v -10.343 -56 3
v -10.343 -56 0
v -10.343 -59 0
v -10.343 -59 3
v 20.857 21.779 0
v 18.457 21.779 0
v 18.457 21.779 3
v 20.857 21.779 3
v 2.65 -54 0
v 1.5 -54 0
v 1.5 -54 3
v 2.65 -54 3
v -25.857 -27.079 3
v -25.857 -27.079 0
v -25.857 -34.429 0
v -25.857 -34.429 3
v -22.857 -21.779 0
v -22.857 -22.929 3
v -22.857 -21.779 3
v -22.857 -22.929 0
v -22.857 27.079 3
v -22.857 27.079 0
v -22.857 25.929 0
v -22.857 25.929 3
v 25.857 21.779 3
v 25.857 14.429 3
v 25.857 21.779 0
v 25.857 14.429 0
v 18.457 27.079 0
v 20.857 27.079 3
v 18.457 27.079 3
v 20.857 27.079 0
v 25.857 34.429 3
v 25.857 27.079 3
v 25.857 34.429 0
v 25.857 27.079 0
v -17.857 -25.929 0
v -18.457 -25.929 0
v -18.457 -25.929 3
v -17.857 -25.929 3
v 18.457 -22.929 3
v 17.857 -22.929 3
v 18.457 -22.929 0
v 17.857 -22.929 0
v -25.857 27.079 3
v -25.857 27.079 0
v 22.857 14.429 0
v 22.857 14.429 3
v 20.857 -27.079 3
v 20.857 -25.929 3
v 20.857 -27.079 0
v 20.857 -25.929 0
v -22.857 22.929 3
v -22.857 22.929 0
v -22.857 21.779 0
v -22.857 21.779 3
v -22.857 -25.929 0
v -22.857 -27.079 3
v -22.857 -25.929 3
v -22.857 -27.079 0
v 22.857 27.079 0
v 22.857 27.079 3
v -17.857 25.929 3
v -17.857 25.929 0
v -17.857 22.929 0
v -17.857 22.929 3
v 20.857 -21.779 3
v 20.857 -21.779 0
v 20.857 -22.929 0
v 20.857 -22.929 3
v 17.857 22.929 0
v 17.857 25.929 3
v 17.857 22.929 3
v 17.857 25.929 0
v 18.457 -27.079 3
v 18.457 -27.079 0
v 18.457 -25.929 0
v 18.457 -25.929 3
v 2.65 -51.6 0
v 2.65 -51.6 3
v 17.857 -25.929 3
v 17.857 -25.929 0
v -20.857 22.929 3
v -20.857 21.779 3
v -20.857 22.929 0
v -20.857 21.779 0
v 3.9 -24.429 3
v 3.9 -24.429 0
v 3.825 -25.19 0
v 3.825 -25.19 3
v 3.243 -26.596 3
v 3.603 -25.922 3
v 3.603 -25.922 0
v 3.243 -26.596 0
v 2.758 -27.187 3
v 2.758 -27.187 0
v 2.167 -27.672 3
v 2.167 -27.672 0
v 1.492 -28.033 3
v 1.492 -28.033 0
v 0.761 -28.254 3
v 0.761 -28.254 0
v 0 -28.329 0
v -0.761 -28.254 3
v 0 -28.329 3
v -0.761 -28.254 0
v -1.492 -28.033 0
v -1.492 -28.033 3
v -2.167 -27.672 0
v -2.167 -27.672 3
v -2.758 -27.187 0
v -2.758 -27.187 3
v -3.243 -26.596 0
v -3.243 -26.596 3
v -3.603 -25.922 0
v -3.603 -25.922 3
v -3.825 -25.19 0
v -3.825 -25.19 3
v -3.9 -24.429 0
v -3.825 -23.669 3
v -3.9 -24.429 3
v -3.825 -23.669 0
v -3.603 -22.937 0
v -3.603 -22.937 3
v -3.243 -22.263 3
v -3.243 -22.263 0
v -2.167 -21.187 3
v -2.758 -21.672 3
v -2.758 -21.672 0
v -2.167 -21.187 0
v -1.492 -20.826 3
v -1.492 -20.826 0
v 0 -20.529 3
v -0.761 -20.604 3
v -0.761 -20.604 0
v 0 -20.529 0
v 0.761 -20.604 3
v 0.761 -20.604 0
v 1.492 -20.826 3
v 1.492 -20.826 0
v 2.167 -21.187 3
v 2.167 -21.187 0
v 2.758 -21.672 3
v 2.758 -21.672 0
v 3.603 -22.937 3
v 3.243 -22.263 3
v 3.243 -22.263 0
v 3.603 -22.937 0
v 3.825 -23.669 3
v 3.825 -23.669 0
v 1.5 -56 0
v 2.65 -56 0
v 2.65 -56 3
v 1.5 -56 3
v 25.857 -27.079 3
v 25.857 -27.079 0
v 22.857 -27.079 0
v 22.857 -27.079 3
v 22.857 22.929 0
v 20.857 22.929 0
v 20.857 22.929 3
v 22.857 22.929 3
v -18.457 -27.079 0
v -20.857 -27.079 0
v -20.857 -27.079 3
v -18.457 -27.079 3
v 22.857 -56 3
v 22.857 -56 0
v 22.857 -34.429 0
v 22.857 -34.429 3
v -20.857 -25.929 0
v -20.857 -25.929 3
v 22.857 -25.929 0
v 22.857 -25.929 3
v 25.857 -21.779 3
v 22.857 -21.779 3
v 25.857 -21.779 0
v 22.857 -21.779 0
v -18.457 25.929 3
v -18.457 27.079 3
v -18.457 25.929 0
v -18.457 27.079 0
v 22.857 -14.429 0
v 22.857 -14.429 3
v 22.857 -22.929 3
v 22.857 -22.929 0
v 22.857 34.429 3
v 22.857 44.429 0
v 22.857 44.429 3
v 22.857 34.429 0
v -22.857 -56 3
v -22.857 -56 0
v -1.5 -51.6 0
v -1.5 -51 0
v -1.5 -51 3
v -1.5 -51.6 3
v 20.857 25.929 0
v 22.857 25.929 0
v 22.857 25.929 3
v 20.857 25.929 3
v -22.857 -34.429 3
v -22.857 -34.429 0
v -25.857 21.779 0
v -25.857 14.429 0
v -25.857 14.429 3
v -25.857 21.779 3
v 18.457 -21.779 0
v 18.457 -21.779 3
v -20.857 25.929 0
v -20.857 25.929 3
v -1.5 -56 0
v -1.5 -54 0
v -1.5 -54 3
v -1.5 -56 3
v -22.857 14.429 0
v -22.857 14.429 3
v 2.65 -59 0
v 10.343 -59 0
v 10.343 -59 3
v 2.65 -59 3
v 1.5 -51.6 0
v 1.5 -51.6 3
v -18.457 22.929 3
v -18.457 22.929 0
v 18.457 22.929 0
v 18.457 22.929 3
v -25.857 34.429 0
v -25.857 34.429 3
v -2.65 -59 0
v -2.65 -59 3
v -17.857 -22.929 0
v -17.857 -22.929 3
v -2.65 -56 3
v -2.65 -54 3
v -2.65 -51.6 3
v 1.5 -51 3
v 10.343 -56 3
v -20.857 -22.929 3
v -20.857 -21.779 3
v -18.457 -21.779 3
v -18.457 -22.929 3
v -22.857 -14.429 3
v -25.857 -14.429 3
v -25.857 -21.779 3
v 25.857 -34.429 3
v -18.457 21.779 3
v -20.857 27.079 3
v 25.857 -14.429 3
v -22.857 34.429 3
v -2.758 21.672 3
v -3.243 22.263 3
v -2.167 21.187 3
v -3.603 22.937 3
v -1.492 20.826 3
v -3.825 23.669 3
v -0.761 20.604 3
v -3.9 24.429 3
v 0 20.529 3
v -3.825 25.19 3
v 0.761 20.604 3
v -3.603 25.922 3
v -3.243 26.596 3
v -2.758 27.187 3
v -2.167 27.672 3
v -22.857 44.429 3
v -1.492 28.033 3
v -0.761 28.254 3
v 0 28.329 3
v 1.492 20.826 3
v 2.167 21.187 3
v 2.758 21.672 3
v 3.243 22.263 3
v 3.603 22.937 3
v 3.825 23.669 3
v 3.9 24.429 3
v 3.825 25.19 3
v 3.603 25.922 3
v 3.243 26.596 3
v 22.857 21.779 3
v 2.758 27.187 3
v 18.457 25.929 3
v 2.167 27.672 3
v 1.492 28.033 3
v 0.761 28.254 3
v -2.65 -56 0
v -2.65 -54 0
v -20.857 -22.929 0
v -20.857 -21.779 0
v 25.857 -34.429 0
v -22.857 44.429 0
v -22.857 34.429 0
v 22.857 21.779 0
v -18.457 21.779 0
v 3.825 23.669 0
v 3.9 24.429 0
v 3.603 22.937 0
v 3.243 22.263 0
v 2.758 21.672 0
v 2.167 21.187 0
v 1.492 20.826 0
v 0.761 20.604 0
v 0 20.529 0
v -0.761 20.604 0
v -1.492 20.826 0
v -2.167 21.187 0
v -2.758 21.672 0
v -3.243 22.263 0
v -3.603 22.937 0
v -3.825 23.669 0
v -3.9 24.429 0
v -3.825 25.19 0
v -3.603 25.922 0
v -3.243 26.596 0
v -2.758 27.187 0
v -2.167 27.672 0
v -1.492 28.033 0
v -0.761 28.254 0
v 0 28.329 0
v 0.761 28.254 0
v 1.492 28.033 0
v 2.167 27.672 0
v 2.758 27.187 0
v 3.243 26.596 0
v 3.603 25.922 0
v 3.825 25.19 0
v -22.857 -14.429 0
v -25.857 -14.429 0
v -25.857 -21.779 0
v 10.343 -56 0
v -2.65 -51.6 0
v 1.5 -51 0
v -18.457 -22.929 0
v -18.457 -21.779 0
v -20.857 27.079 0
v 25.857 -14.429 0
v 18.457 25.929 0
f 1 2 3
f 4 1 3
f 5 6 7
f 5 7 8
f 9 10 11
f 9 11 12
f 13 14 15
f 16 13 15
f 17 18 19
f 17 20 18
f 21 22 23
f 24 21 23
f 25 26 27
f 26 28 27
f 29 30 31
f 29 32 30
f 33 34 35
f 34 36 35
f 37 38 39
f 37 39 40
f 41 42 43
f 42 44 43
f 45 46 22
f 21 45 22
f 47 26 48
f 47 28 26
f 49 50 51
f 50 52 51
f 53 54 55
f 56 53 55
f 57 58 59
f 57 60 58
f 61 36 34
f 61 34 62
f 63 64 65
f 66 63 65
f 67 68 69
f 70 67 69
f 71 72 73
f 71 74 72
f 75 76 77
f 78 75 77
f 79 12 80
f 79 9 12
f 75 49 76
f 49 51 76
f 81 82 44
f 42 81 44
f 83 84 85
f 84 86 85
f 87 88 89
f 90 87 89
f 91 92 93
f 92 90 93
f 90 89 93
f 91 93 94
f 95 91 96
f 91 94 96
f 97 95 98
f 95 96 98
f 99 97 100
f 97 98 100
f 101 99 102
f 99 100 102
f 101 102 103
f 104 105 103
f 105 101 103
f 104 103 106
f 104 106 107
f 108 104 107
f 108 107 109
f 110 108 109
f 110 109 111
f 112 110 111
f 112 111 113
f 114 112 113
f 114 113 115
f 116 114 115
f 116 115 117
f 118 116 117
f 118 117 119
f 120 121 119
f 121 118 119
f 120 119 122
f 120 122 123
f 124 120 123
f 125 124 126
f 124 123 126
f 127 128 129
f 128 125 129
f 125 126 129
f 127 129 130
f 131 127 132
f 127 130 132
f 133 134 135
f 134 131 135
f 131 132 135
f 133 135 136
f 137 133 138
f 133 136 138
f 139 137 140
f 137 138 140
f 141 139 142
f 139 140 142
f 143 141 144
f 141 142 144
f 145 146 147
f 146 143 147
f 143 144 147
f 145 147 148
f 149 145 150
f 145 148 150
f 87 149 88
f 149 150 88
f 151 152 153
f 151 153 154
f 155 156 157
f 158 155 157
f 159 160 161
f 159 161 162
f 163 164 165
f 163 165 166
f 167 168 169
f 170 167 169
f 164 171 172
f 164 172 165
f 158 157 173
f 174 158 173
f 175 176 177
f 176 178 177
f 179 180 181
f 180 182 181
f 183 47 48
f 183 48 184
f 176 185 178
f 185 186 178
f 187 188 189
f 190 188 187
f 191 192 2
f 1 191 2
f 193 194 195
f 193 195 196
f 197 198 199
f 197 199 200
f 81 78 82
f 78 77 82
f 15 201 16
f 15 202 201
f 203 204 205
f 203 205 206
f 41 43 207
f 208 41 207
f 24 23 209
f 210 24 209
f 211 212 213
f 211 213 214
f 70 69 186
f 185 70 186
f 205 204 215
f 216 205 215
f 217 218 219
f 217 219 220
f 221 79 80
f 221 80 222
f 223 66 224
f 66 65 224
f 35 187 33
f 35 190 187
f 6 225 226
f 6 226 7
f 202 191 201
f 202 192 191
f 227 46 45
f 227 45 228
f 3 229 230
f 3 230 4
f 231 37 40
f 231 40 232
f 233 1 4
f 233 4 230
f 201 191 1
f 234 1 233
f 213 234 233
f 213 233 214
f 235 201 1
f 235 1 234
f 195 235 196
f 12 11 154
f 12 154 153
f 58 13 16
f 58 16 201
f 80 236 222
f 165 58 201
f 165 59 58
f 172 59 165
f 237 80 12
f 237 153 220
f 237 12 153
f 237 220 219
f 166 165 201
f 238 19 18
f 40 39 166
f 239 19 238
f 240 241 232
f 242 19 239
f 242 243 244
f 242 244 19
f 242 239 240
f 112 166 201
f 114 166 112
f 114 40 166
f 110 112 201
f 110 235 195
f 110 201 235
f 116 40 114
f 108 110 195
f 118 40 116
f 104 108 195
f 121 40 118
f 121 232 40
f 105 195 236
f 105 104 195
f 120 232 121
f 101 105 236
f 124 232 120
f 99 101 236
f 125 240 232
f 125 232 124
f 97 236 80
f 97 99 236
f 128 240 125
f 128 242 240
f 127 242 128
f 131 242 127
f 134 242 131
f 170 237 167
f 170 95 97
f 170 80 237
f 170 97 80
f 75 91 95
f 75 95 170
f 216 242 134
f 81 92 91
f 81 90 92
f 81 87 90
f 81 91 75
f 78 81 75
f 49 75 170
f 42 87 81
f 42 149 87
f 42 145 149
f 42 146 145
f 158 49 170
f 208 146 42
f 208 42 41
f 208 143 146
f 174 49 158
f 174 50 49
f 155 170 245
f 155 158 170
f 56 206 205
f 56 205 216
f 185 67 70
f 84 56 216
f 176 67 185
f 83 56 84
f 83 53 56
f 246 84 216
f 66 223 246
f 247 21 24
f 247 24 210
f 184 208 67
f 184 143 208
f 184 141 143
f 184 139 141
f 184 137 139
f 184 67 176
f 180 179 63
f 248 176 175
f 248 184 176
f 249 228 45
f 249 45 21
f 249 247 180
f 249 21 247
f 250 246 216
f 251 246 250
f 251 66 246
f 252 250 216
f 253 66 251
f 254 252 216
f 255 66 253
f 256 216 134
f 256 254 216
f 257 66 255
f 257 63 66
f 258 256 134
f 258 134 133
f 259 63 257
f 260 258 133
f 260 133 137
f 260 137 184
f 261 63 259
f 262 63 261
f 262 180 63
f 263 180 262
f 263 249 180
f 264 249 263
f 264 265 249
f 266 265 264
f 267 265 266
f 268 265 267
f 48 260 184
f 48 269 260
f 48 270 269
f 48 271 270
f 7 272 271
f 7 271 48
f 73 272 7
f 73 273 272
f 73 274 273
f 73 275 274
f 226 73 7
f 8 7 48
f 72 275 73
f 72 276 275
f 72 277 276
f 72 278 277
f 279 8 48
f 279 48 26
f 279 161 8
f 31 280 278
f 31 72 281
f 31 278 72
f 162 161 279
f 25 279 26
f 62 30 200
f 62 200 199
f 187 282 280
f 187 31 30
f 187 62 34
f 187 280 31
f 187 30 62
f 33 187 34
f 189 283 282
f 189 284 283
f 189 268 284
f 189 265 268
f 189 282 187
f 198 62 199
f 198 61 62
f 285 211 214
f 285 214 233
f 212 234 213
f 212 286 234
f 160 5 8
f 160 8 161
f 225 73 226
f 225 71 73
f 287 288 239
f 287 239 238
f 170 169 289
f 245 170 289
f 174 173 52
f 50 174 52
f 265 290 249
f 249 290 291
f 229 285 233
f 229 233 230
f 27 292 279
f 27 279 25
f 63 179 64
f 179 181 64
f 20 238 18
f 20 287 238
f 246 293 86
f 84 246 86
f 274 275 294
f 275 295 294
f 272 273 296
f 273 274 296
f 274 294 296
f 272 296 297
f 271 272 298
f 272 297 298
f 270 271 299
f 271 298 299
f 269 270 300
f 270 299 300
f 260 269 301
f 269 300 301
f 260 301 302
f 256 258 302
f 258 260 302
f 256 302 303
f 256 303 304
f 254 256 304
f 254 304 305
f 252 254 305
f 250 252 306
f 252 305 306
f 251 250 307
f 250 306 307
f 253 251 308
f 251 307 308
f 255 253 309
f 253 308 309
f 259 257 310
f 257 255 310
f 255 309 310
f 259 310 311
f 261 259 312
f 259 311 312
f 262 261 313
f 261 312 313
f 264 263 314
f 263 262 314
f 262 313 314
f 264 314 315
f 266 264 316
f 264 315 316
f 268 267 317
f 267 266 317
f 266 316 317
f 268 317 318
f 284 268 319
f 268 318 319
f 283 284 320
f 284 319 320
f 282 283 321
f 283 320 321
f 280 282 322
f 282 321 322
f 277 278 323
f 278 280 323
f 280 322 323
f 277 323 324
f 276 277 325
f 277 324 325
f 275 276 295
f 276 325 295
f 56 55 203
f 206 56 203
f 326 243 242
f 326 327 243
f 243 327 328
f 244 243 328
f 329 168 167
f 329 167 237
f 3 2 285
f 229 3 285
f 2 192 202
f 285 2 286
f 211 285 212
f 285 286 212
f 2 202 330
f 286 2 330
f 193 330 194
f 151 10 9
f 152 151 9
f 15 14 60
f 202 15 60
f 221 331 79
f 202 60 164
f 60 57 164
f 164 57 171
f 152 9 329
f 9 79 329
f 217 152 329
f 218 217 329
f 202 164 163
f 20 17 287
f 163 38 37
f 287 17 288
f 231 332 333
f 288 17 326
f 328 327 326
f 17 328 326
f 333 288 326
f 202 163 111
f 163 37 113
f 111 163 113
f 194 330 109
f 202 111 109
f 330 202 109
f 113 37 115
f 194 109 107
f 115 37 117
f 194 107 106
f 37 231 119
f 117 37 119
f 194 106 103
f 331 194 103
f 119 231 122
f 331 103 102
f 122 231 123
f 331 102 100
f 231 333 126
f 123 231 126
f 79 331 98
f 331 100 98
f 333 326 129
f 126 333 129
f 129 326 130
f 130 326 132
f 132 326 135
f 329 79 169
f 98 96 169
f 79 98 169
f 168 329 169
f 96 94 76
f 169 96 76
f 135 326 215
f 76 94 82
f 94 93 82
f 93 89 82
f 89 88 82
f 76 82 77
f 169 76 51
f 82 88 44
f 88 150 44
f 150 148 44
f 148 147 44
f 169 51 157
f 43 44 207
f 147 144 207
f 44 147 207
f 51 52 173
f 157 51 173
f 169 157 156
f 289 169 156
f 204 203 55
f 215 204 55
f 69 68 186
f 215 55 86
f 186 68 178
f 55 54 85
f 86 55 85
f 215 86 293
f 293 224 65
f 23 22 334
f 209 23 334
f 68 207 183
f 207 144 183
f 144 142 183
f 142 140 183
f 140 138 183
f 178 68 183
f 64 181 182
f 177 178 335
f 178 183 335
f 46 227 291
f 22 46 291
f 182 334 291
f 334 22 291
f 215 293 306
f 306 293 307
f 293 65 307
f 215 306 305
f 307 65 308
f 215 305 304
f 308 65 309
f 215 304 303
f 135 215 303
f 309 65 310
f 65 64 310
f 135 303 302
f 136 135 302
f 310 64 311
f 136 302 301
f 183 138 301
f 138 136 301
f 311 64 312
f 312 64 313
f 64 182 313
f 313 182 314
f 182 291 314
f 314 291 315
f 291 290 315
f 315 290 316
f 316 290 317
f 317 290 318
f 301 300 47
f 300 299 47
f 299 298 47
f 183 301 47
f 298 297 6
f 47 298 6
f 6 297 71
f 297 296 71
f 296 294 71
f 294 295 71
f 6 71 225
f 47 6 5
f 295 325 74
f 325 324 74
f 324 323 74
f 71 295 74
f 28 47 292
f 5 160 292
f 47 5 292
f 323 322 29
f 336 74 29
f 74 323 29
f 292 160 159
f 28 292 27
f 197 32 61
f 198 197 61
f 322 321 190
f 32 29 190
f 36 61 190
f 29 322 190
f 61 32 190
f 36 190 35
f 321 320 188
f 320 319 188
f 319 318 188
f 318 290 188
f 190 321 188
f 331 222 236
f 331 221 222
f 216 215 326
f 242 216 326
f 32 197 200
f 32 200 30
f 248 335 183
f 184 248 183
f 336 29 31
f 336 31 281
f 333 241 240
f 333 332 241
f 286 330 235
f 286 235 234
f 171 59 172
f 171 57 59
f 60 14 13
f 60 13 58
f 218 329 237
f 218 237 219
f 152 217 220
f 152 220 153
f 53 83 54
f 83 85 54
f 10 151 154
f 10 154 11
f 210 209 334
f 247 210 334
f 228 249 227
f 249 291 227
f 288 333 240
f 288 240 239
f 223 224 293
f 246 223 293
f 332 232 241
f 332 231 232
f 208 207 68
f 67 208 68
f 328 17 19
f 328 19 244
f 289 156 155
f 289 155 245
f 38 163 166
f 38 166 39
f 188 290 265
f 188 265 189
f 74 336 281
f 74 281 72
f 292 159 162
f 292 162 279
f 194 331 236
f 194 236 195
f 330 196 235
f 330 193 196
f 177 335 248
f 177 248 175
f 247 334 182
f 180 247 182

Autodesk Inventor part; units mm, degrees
ref_plane "YZ Plane" through (0, 0, 0) normal (1, 0, 0) x (0, 1, 0)
ref_plane "XZ Plane" through (0, 0, 0) normal (0, 1, 0) x (-1, 0, 0)
ref_plane "XY Plane" through (0, 0, 0) normal (0, 0, 1) x (1, 0, 0)
sketch "Sketch1" plane through (0, 0, 0) normal (0, 0, 1) x (1, 0, 0)
  line L0 (-22.8574, 44.4294) -> (22.8574, 44.4294)
  line L1 (10.3429, -56) -> (10.3429, -59)
  line L2 (2.65, -59) -> (2.65, -56)
  line L3 (2.65, -56) -> (1.5, -56)
  line L4 (1.5, -56) -> (1.5, -54)
  line L5 (1.5, -54) -> (2.65, -54)
  line L6 (2.65, -54) -> (2.65, -51.6)
  line L7 (2.65, -51.6) -> (1.5, -51.6)
  line L8 (1.5, -51.6) -> (1.5, -51)
  line L9 (1.5, -51) -> (-1.5, -51)
  line L10 (-1.5, -51) -> (-1.5, -51.6)
  line L11 (-1.5, -51.6) -> (-2.65, -51.6)
  line L12 (-2.65, -51.6) -> (-2.65, -54)
  line L13 (-2.65, -54) -> (-1.5, -54)
  line L14 (-1.5, -56) -> (-2.65, -56)
  line L15 (-1.5, -54) -> (-1.5, -56)
  line L16 (-2.65, -56) -> (-2.65, -59)
  line L17 (-10.3429, -56) -> (-10.3429, -59)
  line L18 (0, -51.179) -> (0, -65.7621) construction
  line L19 (10.3429, -59) -> (2.65, -59)
  line L20 (-2.65, -59) -> (-10.3429, -59)
  line L21 (-24.2882, 0) -> (26.7754, 0) construction
  circle A0 centre (0, -24.4294) radius 3.9
  circle A1 centre (0, 24.4294) radius 3.9
  line L22 (22.8574, -56) -> (22.8574, -34.4294)
  line L23 (22.8574, -34.4294) -> (25.8574, -34.4294)
  line L24 (25.8574, -27.0794) -> (22.8574, -27.0794)
  line L25 (22.8574, -27.0794) -> (22.8574, -25.9294)
  line L26 (22.8574, -25.9294) -> (20.8574, -25.9294)
  line L27 (20.8574, -25.9294) -> (20.8574, -27.0794)
  line L28 (20.8574, -27.0794) -> (18.4574, -27.0794)
  line L29 (18.4574, -27.0794) -> (18.4574, -25.9294)
  line L30 (18.4574, -25.9294) -> (17.8574, -25.9294)
  line L31 (17.8574, -25.9294) -> (17.8574, -22.9294)
  line L32 (17.8574, -22.9294) -> (18.4574, -22.9294)
  line L33 (18.4574, -22.9294) -> (18.4574, -21.7794)
  line L34 (18.4574, -21.7794) -> (20.8574, -21.7794)
  line L35 (20.8574, -21.7794) -> (20.8574, -22.9294)
  line L36 (20.8574, -22.9294) -> (22.8574, -22.9294)
  line L37 (22.8574, -22.9294) -> (22.8574, -21.7794)
  line L38 (22.8574, -21.7794) -> (25.8574, -21.7794)
  line L39 (22.8574, -56) -> (10.3429, -56)
  line L40 (39.0531, -24.4294) -> (-31.8887, -24.4294) construction
  line L41 (25.8574, -14.4294) -> (22.8574, -14.4294)
  line L42 (25.8574, -27.0794) -> (25.8574, -34.4294)
  line L43 (25.8574, -14.4294) -> (25.8574, -21.7794)
  line L44 (22.8574, 44.4294) -> (22.8574, 34.4294)
  line L45 (22.8574, 34.4294) -> (25.8574, 34.4294)
  line L46 (25.8574, 27.0794) -> (22.8574, 27.0794)
  line L47 (22.8574, 27.0794) -> (22.8574, 25.9294)
  line L48 (22.8574, 25.9294) -> (20.8574, 25.9294)
  line L49 (20.8574, 25.9294) -> (20.8574, 27.0794)
  line L50 (20.8574, 27.0794) -> (18.4574, 27.0794)
  line L51 (18.4574, 27.0794) -> (18.4574, 25.9294)
  line L52 (18.4574, 25.9294) -> (17.8574, 25.9294)
  line L53 (17.8574, 25.9294) -> (17.8574, 22.9294)
  line L54 (17.8574, 22.9294) -> (18.4574, 22.9294)
  line L55 (18.4574, 22.9294) -> (18.4574, 21.7794)
  line L56 (18.4574, 21.7794) -> (20.8574, 21.7794)
  line L57 (20.8574, 21.7794) -> (20.8574, 22.9294)
  line L58 (20.8574, 22.9294) -> (22.8574, 22.9294)
  line L59 (22.8574, 22.9294) -> (22.8574, 21.7794)
  line L60 (22.8574, 21.7794) -> (25.8574, 21.7794)
  line L61 (25.8574, 14.4294) -> (22.8574, 14.4294)
  line L62 (25.8574, 27.0794) -> (25.8574, 34.4294)
  line L63 (25.8574, 14.4294) -> (25.8574, 21.7794)
  line L64 (22.8574, 14.4294) -> (22.8574, -14.4294)
  line L65 (0, 77.8205) -> (0, -95.1737) construction
  line L66 (-22.8574, -56) -> (-22.8574, -34.4294)
  line L67 (-22.8574, -34.4294) -> (-25.8574, -34.4294)
  line L68 (-25.8574, -27.0794) -> (-22.8574, -27.0794)
  line L69 (-22.8574, -27.0794) -> (-22.8574, -25.9294)
  line L70 (-22.8574, -25.9294) -> (-20.8574, -25.9294)
  line L71 (-20.8574, -25.9294) -> (-20.8574, -27.0794)
  line L72 (-20.8574, -27.0794) -> (-18.4574, -27.0794)
  line L73 (-18.4574, -27.0794) -> (-18.4574, -25.9294)
  line L74 (-18.4574, -25.9294) -> (-17.8574, -25.9294)
  line L75 (-17.8574, -25.9294) -> (-17.8574, -22.9294)
  line L76 (-17.8574, -22.9294) -> (-18.4574, -22.9294)
  line L77 (-18.4574, -22.9294) -> (-18.4574, -21.7794)
  line L78 (-18.4574, -21.7794) -> (-20.8574, -21.7794)
  line L79 (-20.8574, -21.7794) -> (-20.8574, -22.9294)
  line L80 (-20.8574, -22.9294) -> (-22.8574, -22.9294)
  line L81 (-22.8574, -22.9294) -> (-22.8574, -21.7794)
  line L82 (-22.8574, -21.7794) -> (-25.8574, -21.7794)
  line L83 (-25.8574, -14.4294) -> (-22.8574, -14.4294)
  line L84 (-25.8574, -27.0794) -> (-25.8574, -34.4294)
  line L85 (-25.8574, -14.4294) -> (-25.8574, -21.7794)
  line L86 (-25.8574, 14.4294) -> (-22.8574, 14.4294)
  line L87 (-25.8574, 14.4294) -> (-25.8574, 21.7794)
  line L88 (-22.8574, 21.7794) -> (-25.8574, 21.7794)
  line L89 (-22.8574, 22.9294) -> (-22.8574, 21.7794)
  line L90 (-20.8574, 22.9294) -> (-22.8574, 22.9294)
  line L91 (-20.8574, 21.7794) -> (-20.8574, 22.9294)
  line L92 (-18.4574, 21.7794) -> (-20.8574, 21.7794)
  line L93 (-18.4574, 22.9294) -> (-18.4574, 21.7794)
  line L94 (-17.8574, 22.9294) -> (-18.4574, 22.9294)
  line L95 (-17.8574, 25.9294) -> (-17.8574, 22.9294)
  line L96 (-18.4574, 25.9294) -> (-17.8574, 25.9294)
  line L97 (-18.4574, 27.0794) -> (-18.4574, 25.9294)
  line L98 (-20.8574, 27.0794) -> (-18.4574, 27.0794)
  line L99 (-20.8574, 25.9294) -> (-20.8574, 27.0794)
  line L100 (-22.8574, 25.9294) -> (-20.8574, 25.9294)
  line L101 (-22.8574, 27.0794) -> (-22.8574, 25.9294)
  line L102 (-25.8574, 27.0794) -> (-22.8574, 27.0794)
  line L103 (-25.8574, 27.0794) -> (-25.8574, 34.4294)
  line L104 (-22.8574, 34.4294) -> (-25.8574, 34.4294)
  line L105 (-22.8574, 44.4294) -> (-22.8574, 34.4294)
  line L106 (-22.8574, 14.4294) -> (-22.8574, -14.4294)
  line L107 (-22.8574, -56) -> (-10.3429, -56)
  line L108 (-37.0496, 24.4294) -> (41.724, 24.4294) construction
  point P0 (0, 0)
  dimension "d4" = 3
  dimension "d6" = 3
  dimension "d7" = 2.4
  dimension "d10" = 5.3
  dimension "d11" = 8
  dimension "d12" = 5
  dimension "d13" = 20.6859
  dimension "d14" = 7.8
  dimension "d15" = 34.5706
  dimension "d16" = 7.8
  dimension "d24" = 3
  dimension "d26" = 51.7147
  dimension "d29" = 48.8588
  dimension "d31" = 3
  dimension "d32" = 8
  dimension "d33" = 5.3
  dimension "d36" = 20
  dimension "d37" = 20
  dimension "d38" = 10
  dimension "d39" = 103.4294
extrude "Extrusion1" add sketch "Sketch1" along normal blind 3
equation "\"d13\" = 0.4 * d26"
properties part number "Y-Shafts-Holder_Front-Outer"
